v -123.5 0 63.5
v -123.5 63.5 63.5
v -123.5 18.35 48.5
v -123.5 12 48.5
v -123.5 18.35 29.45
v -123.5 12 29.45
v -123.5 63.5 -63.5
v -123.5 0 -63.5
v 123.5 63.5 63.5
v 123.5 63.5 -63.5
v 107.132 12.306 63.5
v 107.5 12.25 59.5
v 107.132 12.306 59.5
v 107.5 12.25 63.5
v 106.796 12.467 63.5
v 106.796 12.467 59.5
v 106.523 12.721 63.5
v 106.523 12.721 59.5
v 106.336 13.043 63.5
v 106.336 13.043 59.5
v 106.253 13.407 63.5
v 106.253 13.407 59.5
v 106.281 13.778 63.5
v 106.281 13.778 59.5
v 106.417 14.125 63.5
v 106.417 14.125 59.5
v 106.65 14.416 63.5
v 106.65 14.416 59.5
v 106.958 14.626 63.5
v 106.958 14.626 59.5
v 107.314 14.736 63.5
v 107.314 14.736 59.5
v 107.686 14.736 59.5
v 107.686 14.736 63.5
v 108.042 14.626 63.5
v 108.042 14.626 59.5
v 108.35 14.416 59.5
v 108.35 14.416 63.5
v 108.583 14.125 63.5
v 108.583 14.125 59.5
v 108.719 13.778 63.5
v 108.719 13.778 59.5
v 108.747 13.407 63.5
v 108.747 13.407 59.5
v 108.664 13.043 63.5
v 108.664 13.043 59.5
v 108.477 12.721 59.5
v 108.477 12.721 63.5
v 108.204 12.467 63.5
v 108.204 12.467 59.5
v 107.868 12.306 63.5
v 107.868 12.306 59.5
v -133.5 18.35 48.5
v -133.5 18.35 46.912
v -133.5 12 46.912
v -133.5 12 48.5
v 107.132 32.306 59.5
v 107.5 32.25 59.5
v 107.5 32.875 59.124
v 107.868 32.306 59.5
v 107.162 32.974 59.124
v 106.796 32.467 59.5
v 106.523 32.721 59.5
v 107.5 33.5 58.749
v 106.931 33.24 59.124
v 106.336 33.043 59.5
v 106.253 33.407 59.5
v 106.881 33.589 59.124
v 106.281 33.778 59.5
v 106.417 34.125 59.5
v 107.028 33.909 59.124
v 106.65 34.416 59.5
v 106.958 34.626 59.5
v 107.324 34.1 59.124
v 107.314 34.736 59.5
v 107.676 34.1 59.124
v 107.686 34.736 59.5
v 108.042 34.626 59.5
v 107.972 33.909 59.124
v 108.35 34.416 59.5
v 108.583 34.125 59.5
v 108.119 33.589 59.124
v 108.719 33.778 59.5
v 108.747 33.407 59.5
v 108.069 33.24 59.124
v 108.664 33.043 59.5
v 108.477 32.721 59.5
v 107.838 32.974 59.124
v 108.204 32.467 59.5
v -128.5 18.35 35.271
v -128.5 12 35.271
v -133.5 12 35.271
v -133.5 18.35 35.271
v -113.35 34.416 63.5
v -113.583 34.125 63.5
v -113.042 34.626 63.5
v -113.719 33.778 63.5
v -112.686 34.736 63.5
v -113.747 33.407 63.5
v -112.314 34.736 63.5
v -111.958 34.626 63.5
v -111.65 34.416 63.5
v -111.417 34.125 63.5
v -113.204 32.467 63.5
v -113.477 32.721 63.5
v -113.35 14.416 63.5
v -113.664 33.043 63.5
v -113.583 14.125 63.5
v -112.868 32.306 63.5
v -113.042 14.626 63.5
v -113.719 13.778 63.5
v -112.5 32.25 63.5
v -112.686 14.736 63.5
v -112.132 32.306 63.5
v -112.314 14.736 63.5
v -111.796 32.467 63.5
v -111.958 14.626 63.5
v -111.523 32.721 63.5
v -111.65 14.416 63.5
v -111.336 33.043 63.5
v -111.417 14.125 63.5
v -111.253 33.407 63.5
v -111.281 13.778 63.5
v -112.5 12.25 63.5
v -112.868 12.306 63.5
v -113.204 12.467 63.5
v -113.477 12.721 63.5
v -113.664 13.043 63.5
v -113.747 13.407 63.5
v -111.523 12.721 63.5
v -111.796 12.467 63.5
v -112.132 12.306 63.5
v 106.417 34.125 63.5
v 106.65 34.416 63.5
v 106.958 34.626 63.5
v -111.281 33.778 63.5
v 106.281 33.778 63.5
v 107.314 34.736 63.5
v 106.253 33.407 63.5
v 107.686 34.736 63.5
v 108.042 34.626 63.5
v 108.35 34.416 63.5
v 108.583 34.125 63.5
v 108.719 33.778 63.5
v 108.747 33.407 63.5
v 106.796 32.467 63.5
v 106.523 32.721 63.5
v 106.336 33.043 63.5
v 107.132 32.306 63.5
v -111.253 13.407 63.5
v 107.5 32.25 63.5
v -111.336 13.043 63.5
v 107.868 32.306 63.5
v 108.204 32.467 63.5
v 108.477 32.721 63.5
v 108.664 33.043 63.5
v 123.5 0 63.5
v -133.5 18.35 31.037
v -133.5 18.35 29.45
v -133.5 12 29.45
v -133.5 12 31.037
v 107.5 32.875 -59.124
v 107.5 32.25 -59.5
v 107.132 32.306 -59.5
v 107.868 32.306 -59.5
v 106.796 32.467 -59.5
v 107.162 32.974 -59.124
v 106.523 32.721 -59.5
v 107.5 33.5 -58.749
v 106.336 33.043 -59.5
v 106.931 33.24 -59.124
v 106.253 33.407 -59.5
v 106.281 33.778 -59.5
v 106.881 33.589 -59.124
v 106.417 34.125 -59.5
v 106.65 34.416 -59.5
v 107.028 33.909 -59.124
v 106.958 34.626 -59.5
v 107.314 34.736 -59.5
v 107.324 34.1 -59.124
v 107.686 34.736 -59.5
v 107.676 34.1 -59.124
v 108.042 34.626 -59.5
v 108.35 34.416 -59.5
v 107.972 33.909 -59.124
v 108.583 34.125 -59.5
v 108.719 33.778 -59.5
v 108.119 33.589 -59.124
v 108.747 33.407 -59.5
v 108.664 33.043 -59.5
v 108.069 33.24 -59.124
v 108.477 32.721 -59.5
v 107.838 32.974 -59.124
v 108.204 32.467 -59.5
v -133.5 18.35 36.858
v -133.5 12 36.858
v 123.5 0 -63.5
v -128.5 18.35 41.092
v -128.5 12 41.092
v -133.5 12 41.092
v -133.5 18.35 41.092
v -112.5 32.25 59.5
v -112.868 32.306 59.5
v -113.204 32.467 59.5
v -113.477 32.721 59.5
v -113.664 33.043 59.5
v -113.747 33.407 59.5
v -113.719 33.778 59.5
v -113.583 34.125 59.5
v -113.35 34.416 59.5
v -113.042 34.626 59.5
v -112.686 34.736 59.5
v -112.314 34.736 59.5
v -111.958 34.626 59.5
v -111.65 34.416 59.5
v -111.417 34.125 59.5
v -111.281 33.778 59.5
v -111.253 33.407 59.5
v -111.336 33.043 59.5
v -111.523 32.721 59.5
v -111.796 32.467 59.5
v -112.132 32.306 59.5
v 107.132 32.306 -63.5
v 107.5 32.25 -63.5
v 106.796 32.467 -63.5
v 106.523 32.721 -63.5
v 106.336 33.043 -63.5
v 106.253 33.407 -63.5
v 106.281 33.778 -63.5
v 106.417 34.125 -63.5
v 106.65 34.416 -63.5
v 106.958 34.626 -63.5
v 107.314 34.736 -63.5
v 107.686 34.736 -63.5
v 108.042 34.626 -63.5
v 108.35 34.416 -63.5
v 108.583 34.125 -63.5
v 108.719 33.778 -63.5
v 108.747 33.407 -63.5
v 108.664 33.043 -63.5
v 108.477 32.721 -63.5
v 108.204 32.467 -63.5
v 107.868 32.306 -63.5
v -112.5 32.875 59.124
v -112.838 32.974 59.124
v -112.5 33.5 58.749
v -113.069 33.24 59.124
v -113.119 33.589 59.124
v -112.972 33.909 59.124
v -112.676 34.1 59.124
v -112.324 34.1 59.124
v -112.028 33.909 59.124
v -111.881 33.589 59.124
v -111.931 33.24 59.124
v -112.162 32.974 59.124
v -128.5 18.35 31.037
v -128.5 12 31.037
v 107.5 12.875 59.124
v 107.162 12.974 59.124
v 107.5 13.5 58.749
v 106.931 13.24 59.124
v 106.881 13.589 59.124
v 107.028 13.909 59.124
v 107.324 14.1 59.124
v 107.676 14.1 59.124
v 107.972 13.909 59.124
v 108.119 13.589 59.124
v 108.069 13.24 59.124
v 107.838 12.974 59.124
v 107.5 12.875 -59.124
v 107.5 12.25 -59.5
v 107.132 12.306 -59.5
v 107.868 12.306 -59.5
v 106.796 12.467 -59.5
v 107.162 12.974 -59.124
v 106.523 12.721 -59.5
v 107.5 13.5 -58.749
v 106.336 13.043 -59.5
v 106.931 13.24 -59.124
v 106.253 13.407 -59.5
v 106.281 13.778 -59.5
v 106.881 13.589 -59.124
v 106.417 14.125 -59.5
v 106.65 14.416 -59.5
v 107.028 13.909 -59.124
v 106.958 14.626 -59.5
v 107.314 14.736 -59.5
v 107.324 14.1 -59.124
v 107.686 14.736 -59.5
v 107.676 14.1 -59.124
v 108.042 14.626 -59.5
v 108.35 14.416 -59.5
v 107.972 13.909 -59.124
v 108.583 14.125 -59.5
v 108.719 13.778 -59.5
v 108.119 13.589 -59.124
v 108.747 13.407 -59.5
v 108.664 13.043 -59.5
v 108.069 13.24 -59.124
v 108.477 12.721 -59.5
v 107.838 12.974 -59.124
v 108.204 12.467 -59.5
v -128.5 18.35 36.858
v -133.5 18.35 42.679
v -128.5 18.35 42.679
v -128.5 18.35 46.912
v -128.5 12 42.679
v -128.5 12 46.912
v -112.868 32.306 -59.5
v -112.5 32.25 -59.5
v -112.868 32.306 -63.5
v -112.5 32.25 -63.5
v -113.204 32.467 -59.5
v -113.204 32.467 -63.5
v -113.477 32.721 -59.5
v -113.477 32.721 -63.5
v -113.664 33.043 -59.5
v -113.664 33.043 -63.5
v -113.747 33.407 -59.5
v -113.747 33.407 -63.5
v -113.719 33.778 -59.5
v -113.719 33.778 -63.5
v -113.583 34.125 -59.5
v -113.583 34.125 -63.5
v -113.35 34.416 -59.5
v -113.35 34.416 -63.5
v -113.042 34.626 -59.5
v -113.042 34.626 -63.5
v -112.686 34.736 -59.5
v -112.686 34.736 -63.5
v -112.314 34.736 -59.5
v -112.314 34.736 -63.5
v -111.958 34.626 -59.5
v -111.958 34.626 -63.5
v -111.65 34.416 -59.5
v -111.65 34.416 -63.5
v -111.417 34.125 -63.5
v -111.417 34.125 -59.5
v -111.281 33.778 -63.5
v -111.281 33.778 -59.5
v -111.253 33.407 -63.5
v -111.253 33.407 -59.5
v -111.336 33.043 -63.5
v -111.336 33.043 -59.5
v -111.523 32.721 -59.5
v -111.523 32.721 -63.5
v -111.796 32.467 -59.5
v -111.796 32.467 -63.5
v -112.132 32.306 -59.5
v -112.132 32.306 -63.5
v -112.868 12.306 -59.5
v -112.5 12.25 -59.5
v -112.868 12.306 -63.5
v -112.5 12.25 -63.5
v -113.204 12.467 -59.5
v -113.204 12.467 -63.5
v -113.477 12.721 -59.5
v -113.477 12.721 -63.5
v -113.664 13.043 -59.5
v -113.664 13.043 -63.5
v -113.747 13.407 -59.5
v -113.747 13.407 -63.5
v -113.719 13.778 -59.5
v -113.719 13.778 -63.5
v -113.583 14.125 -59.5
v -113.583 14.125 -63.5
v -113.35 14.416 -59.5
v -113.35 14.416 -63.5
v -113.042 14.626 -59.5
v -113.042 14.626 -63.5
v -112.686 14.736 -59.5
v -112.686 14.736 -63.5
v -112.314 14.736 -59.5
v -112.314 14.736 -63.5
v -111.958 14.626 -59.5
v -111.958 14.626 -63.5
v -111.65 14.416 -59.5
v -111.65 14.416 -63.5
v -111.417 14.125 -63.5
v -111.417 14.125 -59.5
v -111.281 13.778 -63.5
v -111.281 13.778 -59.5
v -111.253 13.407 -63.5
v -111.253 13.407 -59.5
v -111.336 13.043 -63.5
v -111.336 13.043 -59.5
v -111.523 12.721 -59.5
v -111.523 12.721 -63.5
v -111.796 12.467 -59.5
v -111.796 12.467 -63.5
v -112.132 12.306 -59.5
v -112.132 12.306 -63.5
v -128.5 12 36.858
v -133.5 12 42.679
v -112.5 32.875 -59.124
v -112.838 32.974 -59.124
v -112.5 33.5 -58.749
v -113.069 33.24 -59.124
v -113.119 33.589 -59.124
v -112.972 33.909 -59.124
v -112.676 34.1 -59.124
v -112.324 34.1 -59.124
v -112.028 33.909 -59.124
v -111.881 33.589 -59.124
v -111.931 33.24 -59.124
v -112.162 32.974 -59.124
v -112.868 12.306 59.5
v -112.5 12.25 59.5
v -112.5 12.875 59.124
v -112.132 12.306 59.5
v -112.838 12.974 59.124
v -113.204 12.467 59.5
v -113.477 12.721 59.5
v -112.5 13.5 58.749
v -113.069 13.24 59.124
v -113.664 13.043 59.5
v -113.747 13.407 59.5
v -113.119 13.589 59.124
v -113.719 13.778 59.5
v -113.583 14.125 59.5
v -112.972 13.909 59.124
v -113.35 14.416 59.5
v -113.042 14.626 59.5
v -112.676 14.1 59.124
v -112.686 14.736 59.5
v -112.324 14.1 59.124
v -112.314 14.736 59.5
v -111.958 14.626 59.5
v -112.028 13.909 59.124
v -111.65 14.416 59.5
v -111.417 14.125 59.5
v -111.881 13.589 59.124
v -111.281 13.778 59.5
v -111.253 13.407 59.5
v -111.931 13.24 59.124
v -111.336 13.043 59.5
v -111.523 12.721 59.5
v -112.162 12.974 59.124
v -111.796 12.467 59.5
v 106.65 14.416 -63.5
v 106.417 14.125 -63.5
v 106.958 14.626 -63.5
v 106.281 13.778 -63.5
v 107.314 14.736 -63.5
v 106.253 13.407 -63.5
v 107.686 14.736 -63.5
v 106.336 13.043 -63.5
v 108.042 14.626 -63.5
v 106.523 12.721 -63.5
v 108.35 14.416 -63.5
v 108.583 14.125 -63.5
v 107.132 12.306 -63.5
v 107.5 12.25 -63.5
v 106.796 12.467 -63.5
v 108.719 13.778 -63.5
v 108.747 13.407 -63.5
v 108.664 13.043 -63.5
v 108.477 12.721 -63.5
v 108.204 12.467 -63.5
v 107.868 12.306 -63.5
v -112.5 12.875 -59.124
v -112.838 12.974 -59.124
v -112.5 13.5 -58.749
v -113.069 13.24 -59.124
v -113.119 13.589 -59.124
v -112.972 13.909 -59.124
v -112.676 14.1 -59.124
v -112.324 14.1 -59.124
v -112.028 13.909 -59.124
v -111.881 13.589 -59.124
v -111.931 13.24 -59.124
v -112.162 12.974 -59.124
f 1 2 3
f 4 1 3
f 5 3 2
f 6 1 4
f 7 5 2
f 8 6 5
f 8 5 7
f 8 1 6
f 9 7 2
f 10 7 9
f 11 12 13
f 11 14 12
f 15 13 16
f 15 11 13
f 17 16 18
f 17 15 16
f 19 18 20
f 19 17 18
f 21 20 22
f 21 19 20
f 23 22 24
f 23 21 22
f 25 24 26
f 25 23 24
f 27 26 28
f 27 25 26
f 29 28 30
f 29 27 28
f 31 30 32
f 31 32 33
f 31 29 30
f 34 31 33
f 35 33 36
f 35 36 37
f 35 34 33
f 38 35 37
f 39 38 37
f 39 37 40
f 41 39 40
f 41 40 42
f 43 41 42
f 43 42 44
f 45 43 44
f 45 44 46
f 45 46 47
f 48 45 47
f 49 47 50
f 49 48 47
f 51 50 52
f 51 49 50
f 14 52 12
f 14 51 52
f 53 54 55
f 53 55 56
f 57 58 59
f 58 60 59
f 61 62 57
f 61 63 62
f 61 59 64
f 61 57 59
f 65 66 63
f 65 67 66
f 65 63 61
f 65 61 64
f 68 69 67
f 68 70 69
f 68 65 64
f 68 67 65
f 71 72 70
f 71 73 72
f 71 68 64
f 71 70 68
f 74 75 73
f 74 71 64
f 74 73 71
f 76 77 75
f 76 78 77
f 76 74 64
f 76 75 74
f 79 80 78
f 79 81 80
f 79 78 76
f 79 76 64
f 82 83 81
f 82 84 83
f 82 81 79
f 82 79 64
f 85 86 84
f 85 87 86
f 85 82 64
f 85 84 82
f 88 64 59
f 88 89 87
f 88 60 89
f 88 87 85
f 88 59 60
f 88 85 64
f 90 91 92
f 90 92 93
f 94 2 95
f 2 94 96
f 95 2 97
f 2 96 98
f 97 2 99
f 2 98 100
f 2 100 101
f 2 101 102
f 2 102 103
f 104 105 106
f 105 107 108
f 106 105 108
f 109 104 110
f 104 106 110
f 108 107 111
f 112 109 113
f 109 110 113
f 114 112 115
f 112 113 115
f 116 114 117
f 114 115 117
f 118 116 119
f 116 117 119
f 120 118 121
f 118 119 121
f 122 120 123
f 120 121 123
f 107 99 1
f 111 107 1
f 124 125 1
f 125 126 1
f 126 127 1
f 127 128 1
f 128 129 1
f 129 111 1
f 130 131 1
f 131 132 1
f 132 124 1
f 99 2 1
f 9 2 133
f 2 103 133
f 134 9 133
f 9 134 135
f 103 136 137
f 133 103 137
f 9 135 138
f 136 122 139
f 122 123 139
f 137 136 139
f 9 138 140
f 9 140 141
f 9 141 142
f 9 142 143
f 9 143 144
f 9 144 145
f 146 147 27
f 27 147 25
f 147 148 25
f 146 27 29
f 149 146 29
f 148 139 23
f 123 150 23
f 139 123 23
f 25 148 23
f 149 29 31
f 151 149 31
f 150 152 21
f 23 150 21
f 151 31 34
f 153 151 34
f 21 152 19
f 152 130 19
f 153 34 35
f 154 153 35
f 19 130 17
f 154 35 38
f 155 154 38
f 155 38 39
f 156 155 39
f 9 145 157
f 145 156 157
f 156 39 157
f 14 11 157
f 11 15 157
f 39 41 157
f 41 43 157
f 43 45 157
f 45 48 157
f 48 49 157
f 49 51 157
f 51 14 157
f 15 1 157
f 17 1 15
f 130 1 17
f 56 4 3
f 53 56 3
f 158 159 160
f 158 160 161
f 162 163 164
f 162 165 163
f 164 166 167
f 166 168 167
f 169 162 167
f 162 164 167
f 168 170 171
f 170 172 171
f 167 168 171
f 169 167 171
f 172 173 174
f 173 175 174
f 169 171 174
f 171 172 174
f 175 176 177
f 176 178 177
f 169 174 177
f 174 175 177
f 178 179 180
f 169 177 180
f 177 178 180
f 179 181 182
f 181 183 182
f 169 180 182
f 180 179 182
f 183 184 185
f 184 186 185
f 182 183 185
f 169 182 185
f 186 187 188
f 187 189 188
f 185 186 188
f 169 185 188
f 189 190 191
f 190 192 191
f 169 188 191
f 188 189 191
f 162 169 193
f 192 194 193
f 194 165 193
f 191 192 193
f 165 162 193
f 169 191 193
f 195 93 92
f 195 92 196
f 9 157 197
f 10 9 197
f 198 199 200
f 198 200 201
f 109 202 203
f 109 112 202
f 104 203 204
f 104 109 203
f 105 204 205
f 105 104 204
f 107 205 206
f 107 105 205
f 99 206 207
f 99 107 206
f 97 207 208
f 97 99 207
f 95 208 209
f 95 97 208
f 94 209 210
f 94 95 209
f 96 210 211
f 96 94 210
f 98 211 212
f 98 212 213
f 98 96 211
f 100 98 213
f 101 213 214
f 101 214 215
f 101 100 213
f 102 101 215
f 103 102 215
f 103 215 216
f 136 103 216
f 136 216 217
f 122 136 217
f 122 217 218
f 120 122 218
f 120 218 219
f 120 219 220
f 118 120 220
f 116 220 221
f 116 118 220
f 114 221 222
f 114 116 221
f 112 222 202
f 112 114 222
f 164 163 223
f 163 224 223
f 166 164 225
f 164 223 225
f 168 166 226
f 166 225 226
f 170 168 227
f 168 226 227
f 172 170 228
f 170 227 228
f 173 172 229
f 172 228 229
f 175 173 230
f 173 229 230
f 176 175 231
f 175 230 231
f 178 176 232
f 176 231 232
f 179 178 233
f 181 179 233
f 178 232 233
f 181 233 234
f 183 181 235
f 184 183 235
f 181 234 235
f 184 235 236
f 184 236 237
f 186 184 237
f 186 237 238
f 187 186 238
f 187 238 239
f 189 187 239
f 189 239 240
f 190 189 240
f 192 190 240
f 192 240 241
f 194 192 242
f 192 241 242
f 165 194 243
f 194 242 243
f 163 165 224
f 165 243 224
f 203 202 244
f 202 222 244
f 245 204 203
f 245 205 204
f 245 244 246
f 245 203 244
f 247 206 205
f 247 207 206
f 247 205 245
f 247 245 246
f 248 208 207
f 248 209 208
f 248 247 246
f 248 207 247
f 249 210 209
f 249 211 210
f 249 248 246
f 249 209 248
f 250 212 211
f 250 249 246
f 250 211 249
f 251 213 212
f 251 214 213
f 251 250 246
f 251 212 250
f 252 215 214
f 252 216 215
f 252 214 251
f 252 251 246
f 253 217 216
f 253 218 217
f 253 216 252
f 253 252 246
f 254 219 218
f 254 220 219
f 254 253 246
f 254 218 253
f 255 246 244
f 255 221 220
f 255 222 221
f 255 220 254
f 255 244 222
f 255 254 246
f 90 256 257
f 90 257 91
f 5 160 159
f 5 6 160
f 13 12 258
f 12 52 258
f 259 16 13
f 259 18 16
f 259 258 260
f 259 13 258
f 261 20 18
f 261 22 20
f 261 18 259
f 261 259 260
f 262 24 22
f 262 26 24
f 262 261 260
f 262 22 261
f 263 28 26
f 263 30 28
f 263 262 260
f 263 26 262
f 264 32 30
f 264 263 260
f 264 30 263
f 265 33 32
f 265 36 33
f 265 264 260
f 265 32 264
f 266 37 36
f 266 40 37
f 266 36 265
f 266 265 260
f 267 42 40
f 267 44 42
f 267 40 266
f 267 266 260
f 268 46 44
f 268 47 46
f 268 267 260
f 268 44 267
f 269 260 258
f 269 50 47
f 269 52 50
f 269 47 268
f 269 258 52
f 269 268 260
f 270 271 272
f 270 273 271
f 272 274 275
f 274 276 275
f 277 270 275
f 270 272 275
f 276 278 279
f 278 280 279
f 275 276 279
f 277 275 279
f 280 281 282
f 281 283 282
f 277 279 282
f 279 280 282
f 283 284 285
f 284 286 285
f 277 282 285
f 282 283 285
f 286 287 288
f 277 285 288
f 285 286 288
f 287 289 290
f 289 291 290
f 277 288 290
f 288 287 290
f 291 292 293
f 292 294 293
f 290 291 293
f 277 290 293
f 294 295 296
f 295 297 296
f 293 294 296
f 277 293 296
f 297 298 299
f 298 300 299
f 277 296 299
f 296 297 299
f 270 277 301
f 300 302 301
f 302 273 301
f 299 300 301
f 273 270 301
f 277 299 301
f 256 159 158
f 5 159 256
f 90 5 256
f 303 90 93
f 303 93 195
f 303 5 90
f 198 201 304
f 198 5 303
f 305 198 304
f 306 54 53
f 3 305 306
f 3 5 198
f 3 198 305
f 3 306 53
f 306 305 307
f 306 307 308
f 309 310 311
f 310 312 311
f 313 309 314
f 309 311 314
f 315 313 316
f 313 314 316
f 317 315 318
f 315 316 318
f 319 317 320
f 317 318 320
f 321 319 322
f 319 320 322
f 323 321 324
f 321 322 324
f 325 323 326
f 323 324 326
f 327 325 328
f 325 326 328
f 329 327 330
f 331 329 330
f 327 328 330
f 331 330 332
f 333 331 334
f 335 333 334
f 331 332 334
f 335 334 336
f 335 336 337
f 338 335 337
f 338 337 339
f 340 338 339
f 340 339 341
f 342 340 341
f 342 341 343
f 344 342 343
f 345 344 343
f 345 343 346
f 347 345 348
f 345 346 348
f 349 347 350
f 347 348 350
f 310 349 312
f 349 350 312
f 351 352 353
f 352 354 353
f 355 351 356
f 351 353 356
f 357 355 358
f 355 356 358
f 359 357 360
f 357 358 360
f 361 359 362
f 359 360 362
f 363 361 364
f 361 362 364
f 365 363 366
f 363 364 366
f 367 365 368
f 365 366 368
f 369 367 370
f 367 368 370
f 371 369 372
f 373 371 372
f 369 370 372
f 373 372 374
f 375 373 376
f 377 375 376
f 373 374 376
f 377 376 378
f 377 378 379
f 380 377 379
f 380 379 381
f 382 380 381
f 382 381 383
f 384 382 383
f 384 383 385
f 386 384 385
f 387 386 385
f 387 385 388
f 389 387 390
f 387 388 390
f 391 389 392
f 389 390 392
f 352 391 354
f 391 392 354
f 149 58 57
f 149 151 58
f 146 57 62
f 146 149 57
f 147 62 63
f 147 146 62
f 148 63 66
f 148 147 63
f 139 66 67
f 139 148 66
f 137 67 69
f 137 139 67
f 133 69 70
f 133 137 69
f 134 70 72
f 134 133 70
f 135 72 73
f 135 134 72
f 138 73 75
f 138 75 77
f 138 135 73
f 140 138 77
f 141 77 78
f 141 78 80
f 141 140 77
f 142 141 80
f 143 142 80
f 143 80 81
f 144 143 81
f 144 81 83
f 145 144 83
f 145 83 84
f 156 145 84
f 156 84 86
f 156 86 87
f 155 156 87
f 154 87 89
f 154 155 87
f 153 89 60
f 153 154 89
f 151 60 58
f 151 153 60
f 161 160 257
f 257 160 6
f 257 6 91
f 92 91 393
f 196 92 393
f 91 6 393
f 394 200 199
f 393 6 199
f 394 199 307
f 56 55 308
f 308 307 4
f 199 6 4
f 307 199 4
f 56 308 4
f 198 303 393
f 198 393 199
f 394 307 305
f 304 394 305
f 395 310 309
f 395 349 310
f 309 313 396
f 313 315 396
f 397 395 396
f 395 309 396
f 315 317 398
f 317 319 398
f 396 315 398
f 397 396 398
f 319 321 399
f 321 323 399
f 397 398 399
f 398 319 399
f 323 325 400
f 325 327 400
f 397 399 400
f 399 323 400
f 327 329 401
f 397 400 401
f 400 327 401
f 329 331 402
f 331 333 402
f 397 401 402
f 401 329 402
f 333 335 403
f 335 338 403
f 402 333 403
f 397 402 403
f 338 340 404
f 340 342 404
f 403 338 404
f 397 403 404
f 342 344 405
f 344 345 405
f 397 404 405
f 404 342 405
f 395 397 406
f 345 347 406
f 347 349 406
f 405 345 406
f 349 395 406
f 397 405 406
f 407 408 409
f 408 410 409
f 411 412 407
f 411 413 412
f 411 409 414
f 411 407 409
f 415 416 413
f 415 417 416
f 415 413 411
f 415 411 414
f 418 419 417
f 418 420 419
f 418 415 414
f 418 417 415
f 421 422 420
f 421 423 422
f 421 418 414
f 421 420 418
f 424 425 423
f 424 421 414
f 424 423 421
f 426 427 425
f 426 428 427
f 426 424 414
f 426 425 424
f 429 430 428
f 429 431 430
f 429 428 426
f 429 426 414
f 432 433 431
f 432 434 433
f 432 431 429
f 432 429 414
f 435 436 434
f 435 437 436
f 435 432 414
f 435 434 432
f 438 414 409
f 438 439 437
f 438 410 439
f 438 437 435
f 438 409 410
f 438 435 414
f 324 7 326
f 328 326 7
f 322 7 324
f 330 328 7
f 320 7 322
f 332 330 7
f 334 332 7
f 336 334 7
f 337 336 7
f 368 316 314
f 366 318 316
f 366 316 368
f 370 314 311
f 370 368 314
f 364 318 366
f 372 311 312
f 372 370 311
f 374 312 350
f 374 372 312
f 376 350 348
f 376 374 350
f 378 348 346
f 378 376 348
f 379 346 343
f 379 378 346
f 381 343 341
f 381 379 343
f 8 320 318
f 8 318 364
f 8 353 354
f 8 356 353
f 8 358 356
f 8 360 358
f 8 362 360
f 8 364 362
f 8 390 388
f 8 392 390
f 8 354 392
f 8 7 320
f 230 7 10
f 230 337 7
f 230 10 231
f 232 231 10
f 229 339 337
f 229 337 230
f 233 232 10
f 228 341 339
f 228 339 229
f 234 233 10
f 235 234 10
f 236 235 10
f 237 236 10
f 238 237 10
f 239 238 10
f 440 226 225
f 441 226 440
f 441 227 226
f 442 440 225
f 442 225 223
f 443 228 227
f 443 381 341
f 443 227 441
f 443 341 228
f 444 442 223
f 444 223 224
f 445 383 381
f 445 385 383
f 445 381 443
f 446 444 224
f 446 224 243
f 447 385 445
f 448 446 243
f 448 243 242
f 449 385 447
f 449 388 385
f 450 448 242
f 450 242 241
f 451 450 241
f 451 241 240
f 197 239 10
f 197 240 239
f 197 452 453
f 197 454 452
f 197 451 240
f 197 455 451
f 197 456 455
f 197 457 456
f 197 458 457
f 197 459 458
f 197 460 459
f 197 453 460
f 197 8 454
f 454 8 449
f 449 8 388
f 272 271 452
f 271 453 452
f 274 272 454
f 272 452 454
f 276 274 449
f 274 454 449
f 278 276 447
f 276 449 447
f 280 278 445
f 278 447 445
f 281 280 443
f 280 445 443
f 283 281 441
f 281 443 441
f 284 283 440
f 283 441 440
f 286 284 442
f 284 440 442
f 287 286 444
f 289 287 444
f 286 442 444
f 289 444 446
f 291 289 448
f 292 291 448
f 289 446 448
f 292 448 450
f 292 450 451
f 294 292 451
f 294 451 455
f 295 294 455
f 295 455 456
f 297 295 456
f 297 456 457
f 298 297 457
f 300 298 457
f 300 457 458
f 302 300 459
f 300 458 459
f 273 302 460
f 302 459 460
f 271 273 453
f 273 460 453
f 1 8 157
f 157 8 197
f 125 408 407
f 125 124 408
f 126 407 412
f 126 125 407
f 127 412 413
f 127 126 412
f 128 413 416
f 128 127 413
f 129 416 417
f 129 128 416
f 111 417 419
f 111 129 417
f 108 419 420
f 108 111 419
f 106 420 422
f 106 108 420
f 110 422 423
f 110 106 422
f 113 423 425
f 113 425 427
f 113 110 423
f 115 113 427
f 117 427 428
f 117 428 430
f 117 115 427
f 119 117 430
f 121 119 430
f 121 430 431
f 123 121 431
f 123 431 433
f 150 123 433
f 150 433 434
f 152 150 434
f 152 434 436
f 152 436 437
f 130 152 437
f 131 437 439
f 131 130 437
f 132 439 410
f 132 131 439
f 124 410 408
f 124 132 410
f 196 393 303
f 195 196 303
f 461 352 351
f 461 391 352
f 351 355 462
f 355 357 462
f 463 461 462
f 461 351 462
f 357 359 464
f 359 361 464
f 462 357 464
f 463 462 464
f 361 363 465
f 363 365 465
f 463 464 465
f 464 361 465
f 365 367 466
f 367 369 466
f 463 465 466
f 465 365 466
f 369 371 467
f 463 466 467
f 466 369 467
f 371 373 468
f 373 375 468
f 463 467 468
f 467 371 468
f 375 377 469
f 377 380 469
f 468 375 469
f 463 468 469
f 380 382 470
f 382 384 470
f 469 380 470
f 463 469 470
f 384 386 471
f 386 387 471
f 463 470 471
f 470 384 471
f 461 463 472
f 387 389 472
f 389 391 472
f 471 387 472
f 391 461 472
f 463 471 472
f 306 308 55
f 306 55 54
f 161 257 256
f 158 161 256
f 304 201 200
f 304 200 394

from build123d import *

# Parameters (mm, degrees)
SKETCH1_W                      = 247
SKETCH1_H                      = 127
BOSS_EXTRUDE1_DEPTH            = 63.5
M3X0_5_TAPPED_HOLE1_AT_2_COUNT = 2
M3X0_5_TAPPED_HOLE1_AT_2_PITCH = 20
M3X0_5_TAPPED_HOLE1_AT_3_COUNT = 2
M3X0_5_TAPPED_HOLE1_AT_3_PITCH = 220.907220344
M3X0_5_TAPPED_HOLE1_AT_4_COUNT = 2
M3X0_5_TAPPED_HOLE1_AT_4_PITCH = 220
SKETCH4_W                      = 19.05
SKETCH4_H                      = 6.35
BOSS_EXTRUDE2_DEPTH            = 5
SKETCH5_W                      = 1.5875
SKETCH5_H                      = 6.35
BOSS_EXTRUDE3_DEPTH            = 5


with BuildPart() as part:
    # Sketch1 → Boss-Extrude1 (new body)
    with BuildSketch(Plane(origin=(0, 0, 0), x_dir=(1, 0, 0), z_dir=(0, 1, 0))):
        Rectangle(SKETCH1_W, SKETCH1_H)
    extrude(amount=BOSS_EXTRUDE1_DEPTH)

    # Sketch3 → M3x0.5 Tapped Hole1 (revolve, cut)
    with BuildSketch(Plane(origin=(-112.5, 33.5, 63.5), x_dir=(0, -1, 0), z_dir=(1, 0, 0))):
        Polygon((0, 0), (0, 4.751075774), (1.25, 4), (1.25, 0), align=None)
    m3x0_5_tapped_hole1 = revolve(axis=Axis((-112.5, 33.5, 69.85), (0, 0, -1)), mode=Mode.SUBTRACT)

    # M3x0.5 Tapped Hole1 at 2: M3x0.5 Tapped Hole1 ×2
    with Locations(*[(0, -i * M3X0_5_TAPPED_HOLE1_AT_2_PITCH, 0) for i in range(1, M3X0_5_TAPPED_HOLE1_AT_2_COUNT)]):
        add(m3x0_5_tapped_hole1, mode=Mode.SUBTRACT)

    # M3x0.5 Tapped Hole1 at 3: M3x0.5 Tapped Hole1 ×2
    with Locations(*[Vector(0.9958932064677039, -0.09053574604251853, 0) * (i * M3X0_5_TAPPED_HOLE1_AT_3_PITCH) for i in range(1, M3X0_5_TAPPED_HOLE1_AT_3_COUNT)]):
        add(m3x0_5_tapped_hole1, mode=Mode.SUBTRACT)

    # M3x0.5 Tapped Hole1 at 4: M3x0.5 Tapped Hole1 ×2
    with Locations(*[(i * M3X0_5_TAPPED_HOLE1_AT_4_PITCH, 0, 0) for i in range(1, M3X0_5_TAPPED_HOLE1_AT_4_COUNT)]):
        add(m3x0_5_tapped_hole1, mode=Mode.SUBTRACT)

    # Mirror1: M3x0.5 Tapped Hole1 across plane
    add(m3x0_5_tapped_hole1.mirror(Plane.XY), mode=Mode.SUBTRACT)

    # Mirror1 copy 1 sketch → Mirror1 copy 1 (revolve, cut)
    with BuildSketch(Plane(origin=(-112.5, 13.5, -63.5), x_dir=(0, -1, 0), z_dir=(1, 0, 0))):
        Polygon((0, 0), (0, -4.751075774), (1.25, -4), (1.25, 0), align=None)
    revolve(axis=Axis((-112.5, 13.5, -69.85), (0, 0, -1)), mode=Mode.SUBTRACT)

    # Mirror1 copy 2 sketch → Mirror1 copy 2 (revolve, cut)
    with BuildSketch(Plane(origin=(107.5, 13.5, -63.5), x_dir=(0, -1, 0), z_dir=(1, 0, 0))):
        Polygon((0, 0), (0, -4.751075774), (1.25, -4), (1.25, 0), align=None)
    revolve(axis=Axis((107.5, 13.5, -69.85), (0, 0, -1)), mode=Mode.SUBTRACT)

    # Mirror1 copy 3 sketch → Mirror1 copy 3 (revolve, cut)
    with BuildSketch(Plane(origin=(107.5, 33.5, -63.5), x_dir=(0, -1, 0), z_dir=(1, 0, 0))):
        Polygon((0, 0), (0, -4.751075774), (1.25, -4), (1.25, 0), align=None)
    revolve(axis=Axis((107.5, 33.5, -69.85), (0, 0, -1)), mode=Mode.SUBTRACT)

    # Sketch4 → Boss-Extrude2 (add)
    with BuildSketch(Plane.ZY.offset(123.5)):
        with Locations((38.975, 15.175)):
            Rectangle(SKETCH4_W, SKETCH4_H)
    extrude(amount=BOSS_EXTRUDE2_DEPTH)

    # Sketch5 → Boss-Extrude3 (add)
    with BuildSketch(Plane.ZY.offset(128.5)):
        with Locations((30.24375, 15.175)):
            Rectangle(SKETCH5_W, SKETCH5_H)
        with Locations((36.064583333, 15.175)):
            Rectangle(SKETCH5_W, SKETCH5_H)
        with Locations((47.70625, 15.175)):
            Rectangle(SKETCH5_W, SKETCH5_H)
        with Locations((41.885416667, 15.175)):
            Rectangle(SKETCH5_W, SKETCH5_H)
    extrude(amount=BOSS_EXTRUDE3_DEPTH)


solid = part.part
